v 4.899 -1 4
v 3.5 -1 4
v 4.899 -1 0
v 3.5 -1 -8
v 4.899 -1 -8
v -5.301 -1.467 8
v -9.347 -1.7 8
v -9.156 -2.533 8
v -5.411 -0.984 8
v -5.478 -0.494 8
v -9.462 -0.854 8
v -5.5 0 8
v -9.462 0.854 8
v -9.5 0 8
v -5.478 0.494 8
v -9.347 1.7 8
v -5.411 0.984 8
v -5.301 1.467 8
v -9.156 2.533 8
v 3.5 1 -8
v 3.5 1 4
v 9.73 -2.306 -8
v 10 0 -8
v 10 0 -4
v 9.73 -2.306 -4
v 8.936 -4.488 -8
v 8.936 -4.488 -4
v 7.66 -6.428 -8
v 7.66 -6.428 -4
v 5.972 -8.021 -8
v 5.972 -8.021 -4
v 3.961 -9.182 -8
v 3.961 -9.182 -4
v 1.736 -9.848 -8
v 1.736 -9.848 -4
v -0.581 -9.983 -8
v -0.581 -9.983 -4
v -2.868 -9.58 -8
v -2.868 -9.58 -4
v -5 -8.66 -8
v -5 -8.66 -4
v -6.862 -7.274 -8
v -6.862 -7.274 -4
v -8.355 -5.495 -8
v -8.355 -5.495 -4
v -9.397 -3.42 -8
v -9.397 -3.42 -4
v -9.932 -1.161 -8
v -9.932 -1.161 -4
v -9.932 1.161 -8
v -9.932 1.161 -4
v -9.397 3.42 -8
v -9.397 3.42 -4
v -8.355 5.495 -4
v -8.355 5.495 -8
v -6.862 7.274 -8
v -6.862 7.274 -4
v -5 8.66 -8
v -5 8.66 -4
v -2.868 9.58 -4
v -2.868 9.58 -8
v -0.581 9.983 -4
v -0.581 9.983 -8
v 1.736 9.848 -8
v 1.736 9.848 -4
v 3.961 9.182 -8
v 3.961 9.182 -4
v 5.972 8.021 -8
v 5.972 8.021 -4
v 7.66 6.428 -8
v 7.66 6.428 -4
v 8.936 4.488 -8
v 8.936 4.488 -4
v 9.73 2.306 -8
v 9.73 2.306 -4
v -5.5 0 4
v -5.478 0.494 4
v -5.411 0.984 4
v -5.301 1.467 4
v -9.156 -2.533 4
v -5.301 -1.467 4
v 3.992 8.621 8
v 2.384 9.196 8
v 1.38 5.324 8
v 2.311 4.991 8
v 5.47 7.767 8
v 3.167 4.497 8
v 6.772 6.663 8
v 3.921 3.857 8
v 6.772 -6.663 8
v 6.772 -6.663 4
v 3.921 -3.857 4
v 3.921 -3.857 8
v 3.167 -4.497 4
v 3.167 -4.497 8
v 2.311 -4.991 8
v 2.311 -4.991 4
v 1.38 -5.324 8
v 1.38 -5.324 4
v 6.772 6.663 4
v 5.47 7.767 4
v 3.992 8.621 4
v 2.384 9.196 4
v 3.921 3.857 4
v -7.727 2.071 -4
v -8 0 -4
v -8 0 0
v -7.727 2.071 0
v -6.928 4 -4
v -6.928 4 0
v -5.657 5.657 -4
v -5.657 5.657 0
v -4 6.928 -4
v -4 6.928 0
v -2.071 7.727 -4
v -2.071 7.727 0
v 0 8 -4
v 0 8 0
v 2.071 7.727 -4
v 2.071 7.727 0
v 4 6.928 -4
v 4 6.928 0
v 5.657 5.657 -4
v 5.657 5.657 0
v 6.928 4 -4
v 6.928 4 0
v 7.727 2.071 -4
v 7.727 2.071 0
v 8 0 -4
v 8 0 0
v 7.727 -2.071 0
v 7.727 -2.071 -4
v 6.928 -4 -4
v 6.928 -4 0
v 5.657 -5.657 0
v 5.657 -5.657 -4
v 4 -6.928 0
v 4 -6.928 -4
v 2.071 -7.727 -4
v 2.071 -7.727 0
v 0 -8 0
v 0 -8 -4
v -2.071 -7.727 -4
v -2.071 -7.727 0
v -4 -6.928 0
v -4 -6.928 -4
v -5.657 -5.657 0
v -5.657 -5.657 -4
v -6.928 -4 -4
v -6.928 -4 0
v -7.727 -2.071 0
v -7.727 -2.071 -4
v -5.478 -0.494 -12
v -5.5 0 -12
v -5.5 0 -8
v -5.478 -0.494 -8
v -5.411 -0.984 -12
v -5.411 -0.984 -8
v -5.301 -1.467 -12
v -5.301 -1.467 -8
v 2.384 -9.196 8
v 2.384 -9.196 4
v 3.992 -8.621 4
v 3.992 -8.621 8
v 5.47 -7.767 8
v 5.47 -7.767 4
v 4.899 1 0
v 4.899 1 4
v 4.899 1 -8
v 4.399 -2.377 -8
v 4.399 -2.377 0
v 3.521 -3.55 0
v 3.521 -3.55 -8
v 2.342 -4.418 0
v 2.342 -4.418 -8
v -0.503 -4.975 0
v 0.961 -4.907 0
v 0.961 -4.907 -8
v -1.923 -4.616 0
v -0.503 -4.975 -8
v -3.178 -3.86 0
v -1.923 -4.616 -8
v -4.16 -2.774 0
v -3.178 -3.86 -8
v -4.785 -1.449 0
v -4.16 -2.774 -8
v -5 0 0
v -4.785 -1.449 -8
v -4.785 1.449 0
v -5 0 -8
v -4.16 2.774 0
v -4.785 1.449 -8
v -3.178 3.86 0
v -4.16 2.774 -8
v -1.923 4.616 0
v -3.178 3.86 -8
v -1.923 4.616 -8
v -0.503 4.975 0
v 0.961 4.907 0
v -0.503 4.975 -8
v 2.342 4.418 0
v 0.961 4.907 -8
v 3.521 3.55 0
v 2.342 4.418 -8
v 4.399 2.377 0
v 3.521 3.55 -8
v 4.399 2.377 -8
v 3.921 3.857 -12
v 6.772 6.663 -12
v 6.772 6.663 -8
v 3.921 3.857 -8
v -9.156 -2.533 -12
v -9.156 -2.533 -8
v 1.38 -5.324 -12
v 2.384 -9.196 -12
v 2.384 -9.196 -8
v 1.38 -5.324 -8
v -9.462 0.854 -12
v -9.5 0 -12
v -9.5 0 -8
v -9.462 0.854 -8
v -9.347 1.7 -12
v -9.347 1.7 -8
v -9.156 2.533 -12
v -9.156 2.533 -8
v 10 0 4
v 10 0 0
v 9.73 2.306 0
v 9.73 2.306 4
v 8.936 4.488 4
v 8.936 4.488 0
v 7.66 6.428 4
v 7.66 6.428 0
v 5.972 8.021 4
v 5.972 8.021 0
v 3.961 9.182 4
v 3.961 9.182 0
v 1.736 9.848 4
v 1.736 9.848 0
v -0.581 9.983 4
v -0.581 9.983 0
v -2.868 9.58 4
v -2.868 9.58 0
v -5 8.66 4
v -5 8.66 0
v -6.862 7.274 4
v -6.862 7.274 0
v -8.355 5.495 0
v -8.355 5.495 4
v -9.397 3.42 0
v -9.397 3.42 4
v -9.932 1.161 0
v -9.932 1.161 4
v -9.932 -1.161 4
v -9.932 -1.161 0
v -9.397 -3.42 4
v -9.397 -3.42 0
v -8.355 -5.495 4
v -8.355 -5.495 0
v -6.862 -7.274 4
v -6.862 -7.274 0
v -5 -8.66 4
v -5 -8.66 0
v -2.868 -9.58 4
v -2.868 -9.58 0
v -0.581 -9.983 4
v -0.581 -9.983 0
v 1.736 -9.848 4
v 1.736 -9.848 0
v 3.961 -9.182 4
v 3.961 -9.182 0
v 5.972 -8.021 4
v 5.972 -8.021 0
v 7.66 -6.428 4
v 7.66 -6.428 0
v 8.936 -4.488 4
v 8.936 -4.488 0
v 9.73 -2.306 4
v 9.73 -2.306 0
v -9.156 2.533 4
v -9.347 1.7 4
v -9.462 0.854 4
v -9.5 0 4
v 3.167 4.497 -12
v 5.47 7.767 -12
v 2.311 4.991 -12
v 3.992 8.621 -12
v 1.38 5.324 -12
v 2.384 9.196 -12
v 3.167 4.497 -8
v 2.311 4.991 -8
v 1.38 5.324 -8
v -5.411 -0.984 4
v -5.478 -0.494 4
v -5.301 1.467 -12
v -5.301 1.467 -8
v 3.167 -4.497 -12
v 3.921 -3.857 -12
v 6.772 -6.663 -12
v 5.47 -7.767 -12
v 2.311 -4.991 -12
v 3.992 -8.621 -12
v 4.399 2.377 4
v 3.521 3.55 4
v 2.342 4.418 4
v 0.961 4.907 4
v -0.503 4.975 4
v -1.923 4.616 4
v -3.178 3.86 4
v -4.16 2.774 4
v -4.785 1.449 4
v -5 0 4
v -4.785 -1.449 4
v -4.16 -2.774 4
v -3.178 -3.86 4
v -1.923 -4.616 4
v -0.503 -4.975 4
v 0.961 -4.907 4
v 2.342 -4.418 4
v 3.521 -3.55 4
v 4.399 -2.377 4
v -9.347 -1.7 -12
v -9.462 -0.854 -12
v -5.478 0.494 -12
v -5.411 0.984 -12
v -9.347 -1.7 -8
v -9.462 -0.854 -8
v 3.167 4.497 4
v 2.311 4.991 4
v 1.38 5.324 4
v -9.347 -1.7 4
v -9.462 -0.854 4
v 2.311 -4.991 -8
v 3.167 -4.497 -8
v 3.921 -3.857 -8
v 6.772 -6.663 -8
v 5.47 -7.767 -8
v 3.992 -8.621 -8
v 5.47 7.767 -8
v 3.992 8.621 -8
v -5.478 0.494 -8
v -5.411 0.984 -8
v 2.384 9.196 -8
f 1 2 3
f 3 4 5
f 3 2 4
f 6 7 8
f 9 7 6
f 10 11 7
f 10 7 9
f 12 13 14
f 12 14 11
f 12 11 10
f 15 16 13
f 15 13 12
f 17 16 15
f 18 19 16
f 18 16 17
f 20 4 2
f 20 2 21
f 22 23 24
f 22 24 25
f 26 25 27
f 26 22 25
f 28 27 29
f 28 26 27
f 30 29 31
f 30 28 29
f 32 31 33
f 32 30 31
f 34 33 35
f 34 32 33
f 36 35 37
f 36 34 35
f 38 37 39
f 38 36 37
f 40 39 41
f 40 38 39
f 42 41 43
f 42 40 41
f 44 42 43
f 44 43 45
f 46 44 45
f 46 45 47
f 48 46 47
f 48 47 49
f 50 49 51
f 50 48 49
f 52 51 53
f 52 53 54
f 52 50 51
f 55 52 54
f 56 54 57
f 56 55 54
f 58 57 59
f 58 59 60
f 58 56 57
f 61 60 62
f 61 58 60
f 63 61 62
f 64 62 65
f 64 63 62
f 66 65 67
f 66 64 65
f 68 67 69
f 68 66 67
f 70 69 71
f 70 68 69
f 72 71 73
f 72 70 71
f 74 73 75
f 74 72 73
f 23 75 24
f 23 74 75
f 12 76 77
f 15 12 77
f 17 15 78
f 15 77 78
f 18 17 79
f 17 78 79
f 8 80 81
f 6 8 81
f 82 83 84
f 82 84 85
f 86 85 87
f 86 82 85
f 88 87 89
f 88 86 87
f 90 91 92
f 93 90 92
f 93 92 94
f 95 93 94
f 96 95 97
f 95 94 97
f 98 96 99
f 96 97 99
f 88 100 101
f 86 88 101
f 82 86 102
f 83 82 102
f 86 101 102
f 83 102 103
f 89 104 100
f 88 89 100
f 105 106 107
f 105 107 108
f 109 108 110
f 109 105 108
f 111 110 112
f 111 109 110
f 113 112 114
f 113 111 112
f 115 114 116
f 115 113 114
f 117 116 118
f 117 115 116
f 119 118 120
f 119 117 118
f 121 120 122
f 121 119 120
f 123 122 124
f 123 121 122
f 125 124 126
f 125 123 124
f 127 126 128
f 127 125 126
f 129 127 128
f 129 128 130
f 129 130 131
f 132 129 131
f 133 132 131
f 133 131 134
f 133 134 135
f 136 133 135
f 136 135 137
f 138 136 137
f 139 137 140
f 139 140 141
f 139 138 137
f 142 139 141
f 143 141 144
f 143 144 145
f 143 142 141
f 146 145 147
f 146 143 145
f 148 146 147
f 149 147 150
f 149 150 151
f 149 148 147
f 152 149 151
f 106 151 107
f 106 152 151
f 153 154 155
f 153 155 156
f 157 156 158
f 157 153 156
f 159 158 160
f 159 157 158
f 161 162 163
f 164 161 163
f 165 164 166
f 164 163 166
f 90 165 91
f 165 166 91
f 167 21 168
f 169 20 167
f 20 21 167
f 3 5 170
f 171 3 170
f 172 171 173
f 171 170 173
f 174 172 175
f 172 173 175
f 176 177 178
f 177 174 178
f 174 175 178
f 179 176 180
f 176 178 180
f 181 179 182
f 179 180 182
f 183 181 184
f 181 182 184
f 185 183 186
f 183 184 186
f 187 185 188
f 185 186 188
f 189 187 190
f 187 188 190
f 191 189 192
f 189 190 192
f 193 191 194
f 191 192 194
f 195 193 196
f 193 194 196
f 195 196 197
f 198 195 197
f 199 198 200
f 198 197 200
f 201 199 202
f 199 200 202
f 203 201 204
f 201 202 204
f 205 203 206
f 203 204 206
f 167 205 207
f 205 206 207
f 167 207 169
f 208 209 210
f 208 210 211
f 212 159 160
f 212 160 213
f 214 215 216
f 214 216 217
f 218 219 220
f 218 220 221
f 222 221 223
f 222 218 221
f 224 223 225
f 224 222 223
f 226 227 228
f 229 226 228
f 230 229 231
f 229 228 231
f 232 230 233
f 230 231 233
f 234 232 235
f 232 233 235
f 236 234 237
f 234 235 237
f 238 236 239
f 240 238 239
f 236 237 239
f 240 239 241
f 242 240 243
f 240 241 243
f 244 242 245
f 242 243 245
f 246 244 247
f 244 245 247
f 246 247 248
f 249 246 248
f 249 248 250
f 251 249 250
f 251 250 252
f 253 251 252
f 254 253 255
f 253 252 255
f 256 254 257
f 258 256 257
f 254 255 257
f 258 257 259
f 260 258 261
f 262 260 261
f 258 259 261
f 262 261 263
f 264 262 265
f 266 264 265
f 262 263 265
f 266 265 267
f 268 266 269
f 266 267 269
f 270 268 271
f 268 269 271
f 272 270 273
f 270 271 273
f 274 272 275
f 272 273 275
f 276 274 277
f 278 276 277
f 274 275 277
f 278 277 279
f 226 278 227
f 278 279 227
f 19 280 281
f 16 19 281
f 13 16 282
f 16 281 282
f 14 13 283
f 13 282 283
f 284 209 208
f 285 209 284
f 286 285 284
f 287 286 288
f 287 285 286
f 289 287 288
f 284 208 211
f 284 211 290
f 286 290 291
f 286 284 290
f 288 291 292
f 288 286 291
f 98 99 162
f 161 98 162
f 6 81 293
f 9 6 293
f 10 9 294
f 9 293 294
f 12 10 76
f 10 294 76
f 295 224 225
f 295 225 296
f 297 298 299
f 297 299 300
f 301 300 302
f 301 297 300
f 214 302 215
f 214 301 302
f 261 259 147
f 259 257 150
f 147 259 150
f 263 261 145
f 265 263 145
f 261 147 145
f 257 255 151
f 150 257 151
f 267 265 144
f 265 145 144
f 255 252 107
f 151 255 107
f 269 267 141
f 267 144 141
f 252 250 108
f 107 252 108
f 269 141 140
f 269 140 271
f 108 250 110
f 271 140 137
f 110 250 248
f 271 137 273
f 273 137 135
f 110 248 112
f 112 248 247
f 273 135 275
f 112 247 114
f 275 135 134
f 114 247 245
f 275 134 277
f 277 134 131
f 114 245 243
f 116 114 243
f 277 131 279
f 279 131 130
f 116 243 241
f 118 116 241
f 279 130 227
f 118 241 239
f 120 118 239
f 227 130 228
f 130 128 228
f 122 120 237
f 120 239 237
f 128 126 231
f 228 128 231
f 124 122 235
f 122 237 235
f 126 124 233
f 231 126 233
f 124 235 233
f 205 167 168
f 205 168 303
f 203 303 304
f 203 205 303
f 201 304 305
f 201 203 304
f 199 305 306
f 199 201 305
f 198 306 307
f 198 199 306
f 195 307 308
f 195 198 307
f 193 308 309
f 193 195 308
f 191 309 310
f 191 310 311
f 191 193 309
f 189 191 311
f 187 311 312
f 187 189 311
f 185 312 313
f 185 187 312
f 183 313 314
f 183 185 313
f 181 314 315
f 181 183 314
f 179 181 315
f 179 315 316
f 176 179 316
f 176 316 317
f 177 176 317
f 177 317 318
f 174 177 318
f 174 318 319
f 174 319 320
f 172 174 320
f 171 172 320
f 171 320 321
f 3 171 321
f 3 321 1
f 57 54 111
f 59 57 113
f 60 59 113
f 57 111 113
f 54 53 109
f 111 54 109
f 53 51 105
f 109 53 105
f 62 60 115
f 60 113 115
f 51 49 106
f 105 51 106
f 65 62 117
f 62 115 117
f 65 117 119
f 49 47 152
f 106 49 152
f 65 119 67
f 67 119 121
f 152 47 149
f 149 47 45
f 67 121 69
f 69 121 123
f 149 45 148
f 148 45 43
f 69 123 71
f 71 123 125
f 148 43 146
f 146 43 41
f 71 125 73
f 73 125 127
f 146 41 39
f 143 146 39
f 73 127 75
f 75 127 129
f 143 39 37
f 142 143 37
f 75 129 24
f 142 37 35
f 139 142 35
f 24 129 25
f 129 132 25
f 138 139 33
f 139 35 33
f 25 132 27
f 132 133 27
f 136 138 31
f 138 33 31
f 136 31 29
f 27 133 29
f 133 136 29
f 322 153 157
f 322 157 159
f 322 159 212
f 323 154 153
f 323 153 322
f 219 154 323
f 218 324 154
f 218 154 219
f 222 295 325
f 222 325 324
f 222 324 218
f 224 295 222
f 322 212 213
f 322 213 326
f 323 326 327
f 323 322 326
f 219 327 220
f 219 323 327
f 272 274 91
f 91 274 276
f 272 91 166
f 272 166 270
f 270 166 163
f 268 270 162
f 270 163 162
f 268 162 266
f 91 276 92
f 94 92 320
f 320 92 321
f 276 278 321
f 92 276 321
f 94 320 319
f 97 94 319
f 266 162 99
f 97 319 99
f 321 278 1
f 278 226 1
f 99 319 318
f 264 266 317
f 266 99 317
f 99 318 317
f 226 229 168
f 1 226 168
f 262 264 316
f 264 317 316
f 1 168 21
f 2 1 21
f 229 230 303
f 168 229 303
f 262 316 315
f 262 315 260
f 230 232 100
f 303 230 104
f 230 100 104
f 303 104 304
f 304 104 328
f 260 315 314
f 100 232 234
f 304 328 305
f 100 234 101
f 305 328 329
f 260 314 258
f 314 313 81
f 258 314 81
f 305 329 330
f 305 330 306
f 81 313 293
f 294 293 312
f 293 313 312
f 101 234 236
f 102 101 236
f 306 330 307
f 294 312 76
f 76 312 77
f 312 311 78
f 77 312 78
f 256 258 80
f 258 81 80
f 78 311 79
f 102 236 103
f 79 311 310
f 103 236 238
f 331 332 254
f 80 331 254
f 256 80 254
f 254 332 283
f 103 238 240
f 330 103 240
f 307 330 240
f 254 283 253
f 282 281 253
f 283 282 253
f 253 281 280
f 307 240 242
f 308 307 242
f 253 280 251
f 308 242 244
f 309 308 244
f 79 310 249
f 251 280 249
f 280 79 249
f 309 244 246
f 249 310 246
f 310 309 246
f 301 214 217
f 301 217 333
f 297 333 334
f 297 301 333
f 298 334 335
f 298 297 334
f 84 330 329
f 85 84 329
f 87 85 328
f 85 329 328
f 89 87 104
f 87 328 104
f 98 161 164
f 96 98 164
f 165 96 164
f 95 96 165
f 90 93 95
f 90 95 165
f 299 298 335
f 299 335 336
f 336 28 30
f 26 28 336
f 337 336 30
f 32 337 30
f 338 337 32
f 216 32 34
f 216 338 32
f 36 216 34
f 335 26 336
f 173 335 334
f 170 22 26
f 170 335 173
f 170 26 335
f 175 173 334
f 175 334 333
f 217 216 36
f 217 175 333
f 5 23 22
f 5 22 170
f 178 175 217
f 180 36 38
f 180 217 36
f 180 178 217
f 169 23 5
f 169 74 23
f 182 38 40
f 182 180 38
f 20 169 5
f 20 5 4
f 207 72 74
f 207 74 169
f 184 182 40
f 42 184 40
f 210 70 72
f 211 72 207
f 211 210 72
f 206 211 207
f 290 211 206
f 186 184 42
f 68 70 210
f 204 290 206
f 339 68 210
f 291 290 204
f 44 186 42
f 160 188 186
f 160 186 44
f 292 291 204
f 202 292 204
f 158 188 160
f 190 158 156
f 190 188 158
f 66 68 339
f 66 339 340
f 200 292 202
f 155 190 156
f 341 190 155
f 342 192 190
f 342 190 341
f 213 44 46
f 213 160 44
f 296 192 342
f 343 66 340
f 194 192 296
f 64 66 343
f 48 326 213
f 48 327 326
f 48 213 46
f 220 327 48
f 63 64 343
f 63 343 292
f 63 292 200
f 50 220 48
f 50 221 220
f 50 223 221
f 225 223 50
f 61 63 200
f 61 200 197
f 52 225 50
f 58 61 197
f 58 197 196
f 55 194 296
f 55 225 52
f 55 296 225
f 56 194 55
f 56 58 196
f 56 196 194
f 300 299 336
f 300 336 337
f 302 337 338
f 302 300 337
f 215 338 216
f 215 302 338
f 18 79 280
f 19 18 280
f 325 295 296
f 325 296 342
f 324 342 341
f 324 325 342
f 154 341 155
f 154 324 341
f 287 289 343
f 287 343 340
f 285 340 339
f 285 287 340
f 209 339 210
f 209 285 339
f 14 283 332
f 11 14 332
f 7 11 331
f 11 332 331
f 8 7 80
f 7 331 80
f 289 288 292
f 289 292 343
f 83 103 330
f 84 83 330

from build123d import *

# Parameters (mm, degrees)
SKETCH1_R           = 10
SKETCH1_R_2         = 5
BOSS_EXTRUDE2_DEPTH = 4
BOSS_EXTRUDE3_DEPTH = 4
SKETCH3_W           = 3
SKETCH3_H           = 2
BOSS_EXTRUDE4_DEPTH = 4
BOSS_EXTRUDE5_START = 4
SKETCH4_R           = 8
BOSS_EXTRUDE5_DEPTH = 4
BOSS_EXTRUDE6_START = 4
SKETCH5_R           = 10
BOSS_EXTRUDE6_DEPTH = 4
BOSS_EXTRUDE7_START = 4
BOSS_EXTRUDE7_DEPTH = 4
BOSS_EXTRUDE8_DEPTH = 10


with BuildPart() as part:
    # Sketch1 → Boss-Extrude2 (new body)
    with BuildSketch(Plane.XY):
        Circle(SKETCH1_R)
        Circle(SKETCH1_R_2, mode=Mode.SUBTRACT)
    extrude(amount=BOSS_EXTRUDE2_DEPTH)

    # Sketch2 → Boss-Extrude3 (add)
    with BuildSketch(Plane.XY.offset(4)):
        with BuildLine():
            ThreePointArc((-5.5, 0), (-5.449982192, 0.74006358), (-5.300838508, 1.466666667))
            Line((-5.300838508, 1.466666667), (-9.155993787, 2.533333333))
            ThreePointArc((-9.155993787, 2.533333333), (-9.413605605, 1.278291639), (-9.5, 0))
            ThreePointArc((-9.5, 0), (-9.413605605, -1.278291639), (-9.155993787, -2.533333333))
            Line((-9.155993787, -2.533333333), (-5.300838508, -1.466666667))
            ThreePointArc((-5.300838508, -1.466666667), (-5.449982192, -0.74006358), (-5.5, 0))
        make_face()
        with BuildLine():
            ThreePointArc((3.920589846, -3.857327476), (2.75, -4.763139721), (1.380248662, -5.323994143))
            Line((1.380248662, -5.323994143), (2.38406587, -9.195989883))
            ThreePointArc((2.38406587, -9.195989883), (4.75, -8.227241336), (6.771927916, -6.66265655))
            Line((6.771927916, -6.66265655), (3.920589846, -3.857327476))
        make_face()
        with BuildLine():
            Line((2.38406587, 9.195989883), (1.380248662, 5.323994143))
            ThreePointArc((1.380248662, 5.323994143), (2.75, 4.763139721), (3.920589846, 3.857327476))
            Line((3.920589846, 3.857327476), (6.771927916, 6.66265655))
            ThreePointArc((6.771927916, 6.66265655), (4.75, 8.227241336), (2.38406587, 9.195989883))
        make_face()
    extrude(amount=BOSS_EXTRUDE3_DEPTH)

    # Sketch3 → Boss-Extrude4 (add)
    with BuildSketch(Plane(origin=(0, 0, 0), x_dir=(-1, 0, 0), z_dir=(0, 0, -1))):
        with Locations((-5, 0)):
            Rectangle(SKETCH3_W, SKETCH3_H)
    extrude(amount=-BOSS_EXTRUDE4_DEPTH)

    # Sketch4 → Boss-Extrude5 (add)
    with BuildSketch(Plane(origin=(0, 0, 0), x_dir=(-1, 0, 0), z_dir=(0, 0, -1)).offset(BOSS_EXTRUDE5_START)):
        Circle(SKETCH4_R)
        with BuildLine():
            Line((-4.974937186, 0.5), (-3.5, 0.5))
            Line((-3.5, 0.5), (-3.5, -1))
            Line((-3.5, -1), (-4.898979486, -1))
            ThreePointArc((-4.898979486, -1), (4.993601667, 0.252868331), (-4.974937186, 0.5))
        make_face(mode=Mode.SUBTRACT)
    extrude(amount=-BOSS_EXTRUDE5_DEPTH)

    # Sketch5 → Boss-Extrude6 (add)
    with BuildSketch(Plane(origin=(0, 0, -4), x_dir=(-1, 0, 0), z_dir=(0, 0, -1)).offset(BOSS_EXTRUDE6_START)):
        with Locations(Location((0, 0, 0), (0, 0, 180))):
            Circle(SKETCH5_R)
        with BuildLine():
            Line((-4.974937186, 0.5), (-3.5, 0.5))
            Line((-3.5, 0.5), (-3.5, -1))
            Line((-3.5, -1), (-4.898979486, -1))
            ThreePointArc((-4.898979486, -1), (4.993601667, 0.252868331), (-4.974937186, 0.5))
        make_face(mode=Mode.SUBTRACT)
    extrude(amount=-BOSS_EXTRUDE6_DEPTH)

    # Sketch6 → Boss-Extrude7 (add)
    with BuildSketch(Plane(origin=(0, 0, -8), x_dir=(-1, 0, 0), z_dir=(0, 0, -1)).offset(BOSS_EXTRUDE7_START)):
        with BuildLine():
            ThreePointArc((-3.920589846, 3.857327476), (-2.75, 4.763139721), (-1.380248662, 5.323994143))
            Line((-1.380248662, 5.323994143), (-2.38406587, 9.195989883))
            ThreePointArc((-2.38406587, 9.195989883), (-4.75, 8.227241336), (-6.771927916, 6.66265655))
            Line((-6.771927916, 6.66265655), (-3.920589846, 3.857327476))
        make_face()
        with BuildLine():
            ThreePointArc((-1.380248662, -5.323994143), (-2.75, -4.763139721), (-3.920589846, -3.857327476))
            Line((-3.920589846, -3.857327476), (-6.771927916, -6.66265655))
            ThreePointArc((-6.771927916, -6.66265655), (-4.75, -8.227241336), (-2.38406587, -9.195989883))
            Line((-2.38406587, -9.195989883), (-1.380248662, -5.323994143))
        make_face()
        with BuildLine():
            Line((9.155993787, 2.533333333), (5.300838508, 1.466666667))
            ThreePointArc((5.300838508, 1.466666667), (5.449982192, 0.74006358), (5.5, 0))
            ThreePointArc((5.5, 0), (5.449982192, -0.74006358), (5.300838508, -1.466666667))
            Line((5.300838508, -1.466666667), (9.155993787, -2.533333333))
            ThreePointArc((9.155993787, -2.533333333), (9.413605605, -1.278291639), (9.5, 0))
            ThreePointArc((9.5, 0), (9.413605605, 1.278291639), (9.155993787, 2.533333333))
        make_face()
    extrude(amount=-BOSS_EXTRUDE7_DEPTH)

    # Sketch10 → Boss-Extrude8 (add)
    with BuildSketch(Plane(origin=(0, 0, -8), x_dir=(-1, 0, 0), z_dir=(0, 0, -1))):
        with BuildLine():
            Line((-3.5, 1), (-4.898979486, 1))
            ThreePointArc((-4.898979486, 1), (-4.943284091, 0.75096098), (-4.974937186, 0.5))
            Line((-4.974937186, 0.5), (-3.5, 0.5))
            Line((-3.5, 0.5), (-3.5, 1))
        make_face()
    extrude(amount=-BOSS_EXTRUDE8_DEPTH)


solid = part.part
